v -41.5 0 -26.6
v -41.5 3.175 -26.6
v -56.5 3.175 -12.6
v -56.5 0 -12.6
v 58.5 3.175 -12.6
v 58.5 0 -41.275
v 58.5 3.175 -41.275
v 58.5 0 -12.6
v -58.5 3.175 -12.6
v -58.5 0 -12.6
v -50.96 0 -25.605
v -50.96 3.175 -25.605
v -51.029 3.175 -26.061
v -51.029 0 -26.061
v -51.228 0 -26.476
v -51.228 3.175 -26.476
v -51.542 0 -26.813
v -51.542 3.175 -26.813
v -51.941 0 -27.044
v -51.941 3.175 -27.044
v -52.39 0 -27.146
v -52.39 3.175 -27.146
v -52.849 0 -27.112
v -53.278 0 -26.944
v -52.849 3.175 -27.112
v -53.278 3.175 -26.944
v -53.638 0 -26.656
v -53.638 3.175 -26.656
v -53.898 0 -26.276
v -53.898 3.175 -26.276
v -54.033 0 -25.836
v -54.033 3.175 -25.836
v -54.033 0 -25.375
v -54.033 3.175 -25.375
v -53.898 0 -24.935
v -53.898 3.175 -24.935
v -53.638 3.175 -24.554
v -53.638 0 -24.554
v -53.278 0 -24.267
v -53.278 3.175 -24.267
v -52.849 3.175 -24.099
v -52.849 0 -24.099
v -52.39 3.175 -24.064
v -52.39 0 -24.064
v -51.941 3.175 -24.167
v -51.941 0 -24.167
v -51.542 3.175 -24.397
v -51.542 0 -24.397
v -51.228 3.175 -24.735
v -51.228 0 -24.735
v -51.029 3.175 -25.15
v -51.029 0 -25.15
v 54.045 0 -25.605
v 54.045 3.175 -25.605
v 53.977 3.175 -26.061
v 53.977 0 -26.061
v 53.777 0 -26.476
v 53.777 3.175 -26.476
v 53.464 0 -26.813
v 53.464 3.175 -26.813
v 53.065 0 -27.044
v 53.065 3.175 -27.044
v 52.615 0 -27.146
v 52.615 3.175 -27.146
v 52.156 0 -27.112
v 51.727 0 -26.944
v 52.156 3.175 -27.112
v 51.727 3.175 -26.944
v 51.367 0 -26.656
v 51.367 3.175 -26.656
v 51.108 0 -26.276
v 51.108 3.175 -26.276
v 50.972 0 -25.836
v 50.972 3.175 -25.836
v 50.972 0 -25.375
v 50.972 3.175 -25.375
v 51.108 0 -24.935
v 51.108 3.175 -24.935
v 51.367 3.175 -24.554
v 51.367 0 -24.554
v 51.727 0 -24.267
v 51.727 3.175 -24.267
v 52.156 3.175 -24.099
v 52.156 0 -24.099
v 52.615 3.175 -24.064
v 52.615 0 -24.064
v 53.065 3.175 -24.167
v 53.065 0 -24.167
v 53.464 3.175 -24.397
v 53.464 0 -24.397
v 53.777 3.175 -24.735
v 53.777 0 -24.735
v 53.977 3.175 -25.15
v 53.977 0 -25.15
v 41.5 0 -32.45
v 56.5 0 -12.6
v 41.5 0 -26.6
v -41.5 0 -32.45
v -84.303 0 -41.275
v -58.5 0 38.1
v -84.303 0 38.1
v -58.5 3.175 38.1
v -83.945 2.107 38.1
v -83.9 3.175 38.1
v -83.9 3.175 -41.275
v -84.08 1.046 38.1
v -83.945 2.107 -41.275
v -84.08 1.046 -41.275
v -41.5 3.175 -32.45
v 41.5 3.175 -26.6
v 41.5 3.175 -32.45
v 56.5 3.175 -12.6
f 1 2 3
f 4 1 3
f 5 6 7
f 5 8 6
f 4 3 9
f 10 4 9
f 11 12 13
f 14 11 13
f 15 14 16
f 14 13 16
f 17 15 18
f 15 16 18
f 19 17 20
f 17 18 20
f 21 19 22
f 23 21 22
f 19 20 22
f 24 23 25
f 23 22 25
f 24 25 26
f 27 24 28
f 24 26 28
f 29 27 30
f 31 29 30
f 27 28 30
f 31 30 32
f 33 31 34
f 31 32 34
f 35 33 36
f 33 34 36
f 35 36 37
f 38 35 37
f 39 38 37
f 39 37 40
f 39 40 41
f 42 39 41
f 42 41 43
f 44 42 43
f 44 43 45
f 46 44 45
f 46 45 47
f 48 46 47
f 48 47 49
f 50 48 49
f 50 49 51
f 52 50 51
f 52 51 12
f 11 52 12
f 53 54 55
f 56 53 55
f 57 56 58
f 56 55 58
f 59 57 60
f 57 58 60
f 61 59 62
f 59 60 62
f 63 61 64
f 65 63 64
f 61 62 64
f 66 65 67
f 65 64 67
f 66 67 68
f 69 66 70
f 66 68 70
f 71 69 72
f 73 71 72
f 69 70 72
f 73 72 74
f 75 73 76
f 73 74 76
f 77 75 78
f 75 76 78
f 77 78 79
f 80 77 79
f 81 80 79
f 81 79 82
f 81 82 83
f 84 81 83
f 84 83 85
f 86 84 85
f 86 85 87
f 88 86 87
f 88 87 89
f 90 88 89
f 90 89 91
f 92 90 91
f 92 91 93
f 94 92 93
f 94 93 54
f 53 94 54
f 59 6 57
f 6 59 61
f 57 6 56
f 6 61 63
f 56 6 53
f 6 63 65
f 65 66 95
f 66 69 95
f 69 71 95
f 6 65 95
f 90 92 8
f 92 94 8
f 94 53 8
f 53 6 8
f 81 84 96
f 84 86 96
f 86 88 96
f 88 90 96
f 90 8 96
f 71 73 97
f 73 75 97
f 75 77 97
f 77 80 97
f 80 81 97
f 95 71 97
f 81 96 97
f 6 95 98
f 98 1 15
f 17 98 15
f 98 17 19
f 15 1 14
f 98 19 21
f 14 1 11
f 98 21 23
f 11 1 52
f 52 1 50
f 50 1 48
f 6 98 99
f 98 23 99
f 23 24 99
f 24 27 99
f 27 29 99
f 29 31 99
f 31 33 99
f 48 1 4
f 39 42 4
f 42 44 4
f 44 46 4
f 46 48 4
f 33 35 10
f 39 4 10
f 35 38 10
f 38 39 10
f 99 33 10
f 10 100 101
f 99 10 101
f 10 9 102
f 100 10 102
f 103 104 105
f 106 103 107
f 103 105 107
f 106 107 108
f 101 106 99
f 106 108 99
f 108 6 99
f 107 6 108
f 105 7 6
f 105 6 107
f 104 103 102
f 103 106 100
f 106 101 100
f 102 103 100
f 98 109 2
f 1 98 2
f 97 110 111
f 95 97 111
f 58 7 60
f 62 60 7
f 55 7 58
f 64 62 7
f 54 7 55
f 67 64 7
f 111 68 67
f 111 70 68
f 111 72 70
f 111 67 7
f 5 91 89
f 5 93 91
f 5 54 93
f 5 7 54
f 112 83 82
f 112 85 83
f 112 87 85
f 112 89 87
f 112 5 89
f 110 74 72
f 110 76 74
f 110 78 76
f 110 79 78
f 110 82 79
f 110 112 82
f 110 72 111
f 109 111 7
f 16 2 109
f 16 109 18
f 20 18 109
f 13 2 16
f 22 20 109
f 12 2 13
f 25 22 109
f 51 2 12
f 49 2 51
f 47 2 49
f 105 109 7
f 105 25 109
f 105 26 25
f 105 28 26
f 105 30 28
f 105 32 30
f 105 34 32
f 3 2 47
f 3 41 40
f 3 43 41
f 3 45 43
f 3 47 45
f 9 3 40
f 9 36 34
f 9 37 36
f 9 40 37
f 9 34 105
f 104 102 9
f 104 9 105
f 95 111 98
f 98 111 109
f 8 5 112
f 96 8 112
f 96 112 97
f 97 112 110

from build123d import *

# Parameters (mm, degrees)
SKETCH1_W            = 190.5
SKETCH1_H            = 76.2
BOSS_EXTRUDE1_DEPTH  = 3.175
SKETCH2_R            = 1.545336663
CUT_EXTRUDE4_DEPTH   = 4.175
SKETCH3_W            = 153.75
SKETCH3_H            = 3.175
BOSS_EXTRUDE2_DEPTH  = 3.175
CUT_SWEEP1_PROFILE_R = 12.7


with BuildPart() as part:
    # Sketch1 → Boss-Extrude1 (new body)
    with BuildSketch(Plane(origin=(0, 0, 0), x_dir=(1, 0, 0), z_dir=(0, 1, 0))):
        Rectangle(SKETCH1_W, SKETCH1_H)
    extrude(amount=BOSS_EXTRUDE1_DEPTH)

    # Sketch2 → Cut-Extrude4 (cut, through all)
    with BuildSketch(Plane(origin=(0, 3.175, 0), x_dir=(1, 0, 0), z_dir=(0, 1, 0))):
        Polygon((-58.5, 12.6), (-58.5, -38.1), (95.25, -38.1), (95.25, 38.1), (58.5, 38.1), (58.5, 12.6), (56.5, 12.6), (41.5, 26.6), (41.5, 32.45), (-41.5, 32.45), (-41.5, 26.6), (-56.5, 12.6), align=None)
        with Locations((-52.505245516, 25.605245516)):
            Circle(SKETCH2_R)
        with Locations((52.5, 25.605245516)):
            Circle(SKETCH2_R)
    extrude(amount=-CUT_EXTRUDE4_DEPTH, mode=Mode.SUBTRACT)

    # Sketch3 → Boss-Extrude2 (add)
    with BuildSketch(Plane(origin=(0, 0, -38.1), x_dir=(-1, 0, 0), z_dir=(0, 0, -1))):
        with Locations((18.375, 1.5875)):
            Rectangle(SKETCH3_W, SKETCH3_H)
    extrude(amount=BOSS_EXTRUDE2_DEPTH)

    # Cut-Sweep1: sweep along a curve in space
    with BuildLine() as cut_sweep1_path:
        Line((-96.6, 3.175, 467.883912637), (-96.6, 3.175, -36.654630794))
        Line((-96.6, 3.175, -36.654630794), (-96.6, 3.175, -207.159673584))
    # Cut-Sweep1 profile (on start of the path) → Cut-Sweep1 (sweep, cut)
    with BuildSketch(Plane(origin=(-96.6, 3.175, 467.883912637), x_dir=(0, -1, 0), z_dir=(0, 0, -1))):
        Circle(CUT_SWEEP1_PROFILE_R)
    sweep(path=cut_sweep1_path.line, mode=Mode.SUBTRACT)


solid = part.part
